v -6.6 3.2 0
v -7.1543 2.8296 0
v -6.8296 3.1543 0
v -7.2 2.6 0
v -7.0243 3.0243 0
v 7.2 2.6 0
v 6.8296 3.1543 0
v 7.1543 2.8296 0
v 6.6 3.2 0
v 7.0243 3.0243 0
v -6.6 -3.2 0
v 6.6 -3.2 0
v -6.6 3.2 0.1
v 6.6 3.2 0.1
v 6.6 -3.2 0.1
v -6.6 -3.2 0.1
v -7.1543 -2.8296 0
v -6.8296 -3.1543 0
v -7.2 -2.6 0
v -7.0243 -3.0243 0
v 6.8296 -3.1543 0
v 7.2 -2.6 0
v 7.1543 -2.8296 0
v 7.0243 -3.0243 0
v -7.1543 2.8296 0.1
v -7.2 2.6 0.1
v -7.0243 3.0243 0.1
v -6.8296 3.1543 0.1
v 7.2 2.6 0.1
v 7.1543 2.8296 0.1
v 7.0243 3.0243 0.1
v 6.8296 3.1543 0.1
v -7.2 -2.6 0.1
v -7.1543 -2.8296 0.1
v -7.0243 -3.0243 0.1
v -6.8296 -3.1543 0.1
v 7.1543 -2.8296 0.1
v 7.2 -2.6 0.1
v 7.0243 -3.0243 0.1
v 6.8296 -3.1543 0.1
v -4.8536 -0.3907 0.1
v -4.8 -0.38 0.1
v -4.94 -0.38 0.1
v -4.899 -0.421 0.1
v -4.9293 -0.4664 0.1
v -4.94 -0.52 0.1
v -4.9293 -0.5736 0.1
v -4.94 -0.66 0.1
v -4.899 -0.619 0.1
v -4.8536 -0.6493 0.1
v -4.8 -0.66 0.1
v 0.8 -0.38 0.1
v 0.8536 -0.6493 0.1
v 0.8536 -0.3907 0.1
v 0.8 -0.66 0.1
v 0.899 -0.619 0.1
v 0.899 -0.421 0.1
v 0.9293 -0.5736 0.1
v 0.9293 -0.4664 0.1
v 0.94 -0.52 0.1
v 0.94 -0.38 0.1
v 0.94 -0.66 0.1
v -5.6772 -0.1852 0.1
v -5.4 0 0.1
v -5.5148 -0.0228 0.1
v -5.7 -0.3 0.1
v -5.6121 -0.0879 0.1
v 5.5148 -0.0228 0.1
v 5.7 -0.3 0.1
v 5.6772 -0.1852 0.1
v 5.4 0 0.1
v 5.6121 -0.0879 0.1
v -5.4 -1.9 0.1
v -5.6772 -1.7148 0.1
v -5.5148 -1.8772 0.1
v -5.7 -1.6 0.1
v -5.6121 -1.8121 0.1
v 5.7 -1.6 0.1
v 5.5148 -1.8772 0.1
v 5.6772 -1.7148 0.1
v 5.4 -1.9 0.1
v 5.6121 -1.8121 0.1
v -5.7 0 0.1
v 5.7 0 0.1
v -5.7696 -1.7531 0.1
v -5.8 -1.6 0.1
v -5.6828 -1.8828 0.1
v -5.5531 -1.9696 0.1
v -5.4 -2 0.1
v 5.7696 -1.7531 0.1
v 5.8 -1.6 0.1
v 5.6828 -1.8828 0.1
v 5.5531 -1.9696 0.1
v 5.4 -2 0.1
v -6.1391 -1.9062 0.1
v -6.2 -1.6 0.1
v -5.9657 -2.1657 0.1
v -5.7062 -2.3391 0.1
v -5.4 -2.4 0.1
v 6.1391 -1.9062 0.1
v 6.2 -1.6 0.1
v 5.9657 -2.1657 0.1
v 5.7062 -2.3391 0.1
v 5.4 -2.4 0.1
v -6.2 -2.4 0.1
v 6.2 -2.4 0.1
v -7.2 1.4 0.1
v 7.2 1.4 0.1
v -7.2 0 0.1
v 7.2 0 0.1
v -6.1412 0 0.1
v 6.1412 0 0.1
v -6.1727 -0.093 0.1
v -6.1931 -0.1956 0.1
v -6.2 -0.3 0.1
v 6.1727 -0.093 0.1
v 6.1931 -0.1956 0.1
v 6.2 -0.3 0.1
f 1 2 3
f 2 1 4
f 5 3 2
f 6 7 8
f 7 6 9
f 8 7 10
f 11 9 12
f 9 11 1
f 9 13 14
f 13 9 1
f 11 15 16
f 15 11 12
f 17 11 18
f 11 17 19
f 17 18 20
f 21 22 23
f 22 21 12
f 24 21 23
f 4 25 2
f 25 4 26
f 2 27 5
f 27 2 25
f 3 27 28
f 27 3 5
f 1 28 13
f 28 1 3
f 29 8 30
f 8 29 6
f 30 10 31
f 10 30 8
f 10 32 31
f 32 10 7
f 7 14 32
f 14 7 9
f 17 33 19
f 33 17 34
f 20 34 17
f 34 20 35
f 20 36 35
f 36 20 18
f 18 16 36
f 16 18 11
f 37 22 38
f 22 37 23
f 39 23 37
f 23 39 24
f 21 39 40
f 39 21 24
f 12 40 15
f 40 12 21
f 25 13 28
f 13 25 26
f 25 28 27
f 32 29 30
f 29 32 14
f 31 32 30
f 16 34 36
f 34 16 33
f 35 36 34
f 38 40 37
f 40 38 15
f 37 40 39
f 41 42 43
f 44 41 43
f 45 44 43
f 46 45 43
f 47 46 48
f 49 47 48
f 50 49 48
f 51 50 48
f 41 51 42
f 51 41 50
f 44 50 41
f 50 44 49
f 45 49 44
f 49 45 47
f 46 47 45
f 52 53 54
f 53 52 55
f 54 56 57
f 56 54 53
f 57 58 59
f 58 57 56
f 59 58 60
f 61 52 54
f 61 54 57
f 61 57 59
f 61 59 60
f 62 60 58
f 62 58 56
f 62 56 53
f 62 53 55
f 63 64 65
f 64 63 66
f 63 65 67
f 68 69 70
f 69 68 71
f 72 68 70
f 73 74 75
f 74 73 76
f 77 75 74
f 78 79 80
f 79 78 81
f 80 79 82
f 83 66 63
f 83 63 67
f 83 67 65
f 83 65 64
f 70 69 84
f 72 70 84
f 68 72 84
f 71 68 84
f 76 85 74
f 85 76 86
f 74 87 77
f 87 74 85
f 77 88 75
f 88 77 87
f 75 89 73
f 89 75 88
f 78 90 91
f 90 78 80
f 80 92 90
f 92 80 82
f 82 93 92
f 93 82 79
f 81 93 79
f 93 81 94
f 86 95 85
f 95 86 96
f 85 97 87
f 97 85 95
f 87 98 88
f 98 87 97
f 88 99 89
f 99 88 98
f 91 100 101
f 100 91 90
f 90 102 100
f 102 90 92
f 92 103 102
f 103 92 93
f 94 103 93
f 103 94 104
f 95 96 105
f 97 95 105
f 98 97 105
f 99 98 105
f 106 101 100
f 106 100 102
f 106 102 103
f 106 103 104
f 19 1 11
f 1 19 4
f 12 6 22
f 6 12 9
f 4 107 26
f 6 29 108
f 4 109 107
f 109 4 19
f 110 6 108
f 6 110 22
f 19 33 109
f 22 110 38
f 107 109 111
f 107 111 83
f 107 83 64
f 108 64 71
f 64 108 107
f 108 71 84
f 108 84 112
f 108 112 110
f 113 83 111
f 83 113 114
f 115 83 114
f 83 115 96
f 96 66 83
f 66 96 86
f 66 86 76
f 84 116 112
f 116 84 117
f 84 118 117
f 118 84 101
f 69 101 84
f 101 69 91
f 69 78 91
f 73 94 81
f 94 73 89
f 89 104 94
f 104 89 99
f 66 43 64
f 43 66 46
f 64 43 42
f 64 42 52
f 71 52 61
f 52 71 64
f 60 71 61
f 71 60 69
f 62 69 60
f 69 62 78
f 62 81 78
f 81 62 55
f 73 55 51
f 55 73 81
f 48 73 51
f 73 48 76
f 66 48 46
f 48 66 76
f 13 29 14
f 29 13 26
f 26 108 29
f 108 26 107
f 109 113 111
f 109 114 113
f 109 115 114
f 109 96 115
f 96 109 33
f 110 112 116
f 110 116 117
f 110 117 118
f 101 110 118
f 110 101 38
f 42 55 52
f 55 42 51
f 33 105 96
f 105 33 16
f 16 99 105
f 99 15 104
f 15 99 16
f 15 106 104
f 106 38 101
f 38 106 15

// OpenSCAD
// file: ../p/box3u12.scad
use <../lib.scad>
function ldraw_lib__box3u12() = [
// 0 Box with 3 Parallel Faces without Any Edges
// 0 Name: box3u12.dat
// 0 Author: J.C. Tchang [tchang]
// 0 !LDRAW_ORG Primitive UPDATE 2014-02
// 0 !LICENSE Licensed under CC BY 4.0 : see CAreadme.txt
// 
// 0 BFC CERTIFY CCW
  [0,"BFC","CERTIFY"],
  [0,"BFC","CCW"],
// 
// 0 !HISTORY 2014-12-23 [PTadmin] Official Update 2014-02
// 
// 
// 4 16 -1 1 1 1 1 1 1 1 -1 -1 1 -1
  [4,16,-1,1,1,1,1,1,1,1,-1,-1,1,-1],
// 4 16 -1 1 1 -1 0 1 1 0 1 1 1 1
  [4,16,-1,1,1,-1,0,1,1,0,1,1,1,1],
// 4 16 1 1 -1 1 0 -1 -1 0 -1 -1 1 -1
  [4,16,1,1,-1,1,0,-1,-1,0,-1,-1,1,-1],
];
module ldraw_lib__box3u12(step=0, col=false, unit=2/5, alt=false, line=0.2, solid=!$preview)
    makepoly(ldraw_lib__box3u12(), step=step, col=col, unit=unit, alt=alt, line=line, solid=solid);
ldraw_lib__box3u12(line=0.2);
// file: ../p/2-4ndis.scad
use <../lib.scad>
function ldraw_lib__2_4ndis() = [
// 0 Disc Negative 0.5
// 0 Name: 2-4ndis.dat
// 0 Author: James Jessiman
// 0 !LDRAW_ORG Primitive UPDATE 2012-01
// 0 !LICENSE Licensed under CC BY 4.0 : see CAreadme.txt
// 
// 0 BFC CERTIFY CCW
  [0,"BFC","CERTIFY"],
  [0,"BFC","CCW"],
// 
// 0 !HISTORY 2002-03-23 [sbliss] Added BFC statement; compacted code
// 0 !HISTORY 2002-04-25 [PTadmin] Official Update 2002-02
// 0 !HISTORY 2007-06-24 [PTadmin] Header formatted for Contributor Agreement
// 0 !HISTORY 2008-07-01 [PTadmin] Official Update 2008-01
// 0 !HISTORY 2012-02-16 [Philo] Changed to CCW
// 0 !HISTORY 2012-03-30 [PTadmin] Official Update 2012-01
// 
// 
// 3 16 0.9239 0 0.3827 1 0 0 1 0 1
  [3,16,0.9239,0,0.3827,1,0,0,1,0,1],
// 3 16 0.7071 0 0.7071 0.9239 0 0.3827 1 0 1
  [3,16,0.7071,0,0.7071,0.9239,0,0.3827,1,0,1],
// 3 16 0.3827 0 0.9239 0.7071 0 0.7071 1 0 1
  [3,16,0.3827,0,0.9239,0.7071,0,0.7071,1,0,1],
// 3 16 0 0 1 0.3827 0 0.9239 1 0 1
  [3,16,0,0,1,0.3827,0,0.9239,1,0,1],
// 3 16 -0.3827 0 0.9239 0 0 1 -1 0 1
  [3,16,-0.3827,0,0.9239,0,0,1,-1,0,1],
// 3 16 -0.7071 0 0.7071 -0.3827 0 0.9239 -1 0 1
  [3,16,-0.7071,0,0.7071,-0.3827,0,0.9239,-1,0,1],
// 3 16 -0.9239 0 0.3827 -0.7071 0 0.7071 -1 0 1
  [3,16,-0.9239,0,0.3827,-0.7071,0,0.7071,-1,0,1],
// 3 16 -1 0 0 -0.9239 0 0.3827 -1 0 1
  [3,16,-1,0,0,-0.9239,0,0.3827,-1,0,1],
];
module ldraw_lib__2_4ndis(step=0, col=false, unit=2/5, alt=false, line=0.2, solid=!$preview)
    makepoly(ldraw_lib__2_4ndis(), step=step, col=col, unit=unit, alt=alt, line=line, solid=solid);
ldraw_lib__2_4ndis(line=0.2);
// file: ../p/2-4chrd.scad
use <../lib.scad>
function ldraw_lib__2_4chrd() = [
// 0 Chord 0.5
// 0 Name: 2-4chrd.dat
// 0 Author: Philippe Hurbain [Philo]
// 0 !LDRAW_ORG Primitive UPDATE 2014-01
// 0 !LICENSE Licensed under CC BY 4.0 : see CAreadme.txt
// 
// 0 BFC CERTIFY CCW
  [0,"BFC","CERTIFY"],
  [0,"BFC","CCW"],
// 
// 0 !HISTORY 2014-06-21 [PTadmin] Official Update 2014-01
// 
// 
// 4 16 0.9239 0 0.3827 -0.9239 0 0.3827 -1 0 0 1 0 0
  [4,16,0.9239,0,0.3827,-0.9239,0,0.3827,-1,0,0,1,0,0],
// 4 16 0.7071 0 0.7071 -0.7071 0 0.7071 -0.9239 0 0.3827 0.9239 0 0.3827
  [4,16,0.7071,0,0.7071,-0.7071,0,0.7071,-0.9239,0,0.3827,0.9239,0,0.3827],
// 4 16 0.3827 0 0.9239 -0.3827 0 0.9239 -0.7071 0 0.7071 0.7071 0 0.7071
  [4,16,0.3827,0,0.9239,-0.3827,0,0.9239,-0.7071,0,0.7071,0.7071,0,0.7071],
// 3 16 0 0 1 -0.3827 0 0.9239 0.3827 0 0.9239
  [3,16,0,0,1,-0.3827,0,0.9239,0.3827,0,0.9239],
];
module ldraw_lib__2_4chrd(step=0, col=false, unit=2/5, alt=false, line=0.2, solid=!$preview)
    makepoly(ldraw_lib__2_4chrd(), step=step, col=col, unit=unit, alt=alt, line=line, solid=solid);
ldraw_lib__2_4chrd(line=0.2);
// file: ../p/1-4ring3.scad
use <../lib.scad>
function ldraw_lib__1_4ring3() = [
// 0 Ring  3 x 0.25
// 0 Name: 1-4ring3.dat
// 0 Author: Karim Nassar
// 0 !LDRAW_ORG Primitive UPDATE 2012-01
// 0 !LICENSE Licensed under CC BY 2.0 and CC BY 4.0 : see CAreadme.txt
// 
// 0 BFC CERTIFY CCW
  [0,"BFC","CERTIFY"],
  [0,"BFC","CCW"],
// 
// 0 !HISTORY 1999-07-05 [PTadmin] Official Update 1999-05
// 0 !HISTORY 2003-01-21 [cavehop] Update Added BFC and 1 digit of significance
// 0 !HISTORY 2003-05-21 [cavehop] Corrected values as indicated by pneaster
// 0 !HISTORY 2003-06-12 [cavehop] Re-corrected values as indicated by pneaster
// 0 !HISTORY 2003-08-01 [PTadmin] Official Update 2003-02
// 0 !HISTORY 2007-06-22 [PTadmin] Header formatted for Contributor Agreement
// 0 !HISTORY 2008-07-01 [PTadmin] Official Update 2008-01
// 0 !HISTORY 2012-02-16 [Philo] Changed to CCW
// 0 !HISTORY 2012-03-30 [PTadmin] Official Update 2012-01
// 
// 
// 4 16 4 0 0 3.6956 0 1.5308 2.7717 0 1.1481 3 0 0
  [4,16,4,0,0,3.6956,0,1.5308,2.7717,0,1.1481,3,0,0],
// 4 16 3.6956 0 1.5308 2.8284 0 2.8284 2.1213 0 2.1213 2.7717 0 1.1481
  [4,16,3.6956,0,1.5308,2.8284,0,2.8284,2.1213,0,2.1213,2.7717,0,1.1481],
// 4 16 2.8284 0 2.8284 1.5308 0 3.6956 1.1481 0 2.7717 2.1213 0 2.1213
  [4,16,2.8284,0,2.8284,1.5308,0,3.6956,1.1481,0,2.7717,2.1213,0,2.1213],
// 4 16 1.5308 0 3.6956 0 0 4 0 0 3 1.1481 0 2.7717
  [4,16,1.5308,0,3.6956,0,0,4,0,0,3,1.1481,0,2.7717],
];
module ldraw_lib__1_4ring3(step=0, col=false, unit=2/5, alt=false, line=0.2, solid=!$preview)
    makepoly(ldraw_lib__1_4ring3(), step=step, col=col, unit=unit, alt=alt, line=line, solid=solid);
ldraw_lib__1_4ring3(line=0.2);
// file: ../p/1-4ring1.scad
use <../lib.scad>
function ldraw_lib__1_4ring1() = [
// 0 Ring  1 x 0.25
// 0 Name: 1-4ring1.dat
// 0 Author: Chris Dee [cwdee]
// 0 !LDRAW_ORG Primitive UPDATE 2012-01
// 0 !LICENSE Licensed under CC BY 2.0 and CC BY 4.0 : see CAreadme.txt
// 
// 0 BFC CERTIFY CCW
  [0,"BFC","CERTIFY"],
  [0,"BFC","CCW"],
// 
// 0 !HISTORY 2000-05-07 [PTadmin] Official Update 2000-01
// 0 !HISTORY 2002-11-22 [hafhead] Added BFC statement
// 0 !HISTORY 2002-11-30 [PTadmin] Official Update 2002-05
// 0 !HISTORY 2007-06-22 [PTadmin] Header formatted for Contributor Agreement
// 0 !HISTORY 2008-07-01 [PTadmin] Official Update 2008-01
// 0 !HISTORY 2012-02-16 [Philo] Changed to CCW
// 0 !HISTORY 2012-03-30 [PTadmin] Official Update 2012-01
// 
// 
// 4 16 2 0 0 1.8478 0 0.7654 0.9239 0 0.3827 1 0 0
  [4,16,2,0,0,1.8478,0,0.7654,0.9239,0,0.3827,1,0,0],
// 4 16 1.8478 0 0.7654 1.4142 0 1.4142 0.7071 0 0.7071 0.9239 0 0.3827
  [4,16,1.8478,0,0.7654,1.4142,0,1.4142,0.7071,0,0.7071,0.9239,0,0.3827],
// 4 16 1.4142 0 1.4142 0.7654 0 1.8478 0.3827 0 0.9239 0.7071 0 0.7071
  [4,16,1.4142,0,1.4142,0.7654,0,1.8478,0.3827,0,0.9239,0.7071,0,0.7071],
// 4 16 0.7654 0 1.8478 0 0 2 0 0 1 0.3827 0 0.9239
  [4,16,0.7654,0,1.8478,0,0,2,0,0,1,0.3827,0,0.9239],
];
module ldraw_lib__1_4ring1(step=0, col=false, unit=2/5, alt=false, line=0.2, solid=!$preview)
    makepoly(ldraw_lib__1_4ring1(), step=step, col=col, unit=unit, alt=alt, line=line, solid=solid);
ldraw_lib__1_4ring1(line=0.2);
// file: ../p/1-4ndis.scad
use <../lib.scad>
function ldraw_lib__1_4ndis() = [
// 0 Disc Negative 0.25
// 0 Name: 1-4ndis.dat
// 0 Author: James Jessiman
// 0 !LDRAW_ORG Primitive UPDATE 2012-01
// 0 !LICENSE Licensed under CC BY 4.0 : see CAreadme.txt
// 
// 0 BFC CERTIFY CCW
  [0,"BFC","CERTIFY"],
  [0,"BFC","CCW"],
// 
// 0 !HISTORY 2002-03-23 [sbliss] Added BFC Statement
// 0 !HISTORY 2002-04-25 [PTadmin] Official Update 2002-02
// 0 !HISTORY 2007-06-22 [PTadmin] Header formatted for Contributor Agreement
// 0 !HISTORY 2008-07-01 [PTadmin] Official Update 2008-01
// 0 !HISTORY 2012-02-16 [Philo] Changed to CCW
// 0 !HISTORY 2012-03-30 [PTadmin] Official Update 2012-01
// 
// 
// 3 16 0.9239 0 0.3827 1 0 0 1 0 1
  [3,16,0.9239,0,0.3827,1,0,0,1,0,1],
// 3 16 0.7071 0 0.7071 0.9239 0 0.3827 1 0 1
  [3,16,0.7071,0,0.7071,0.9239,0,0.3827,1,0,1],
// 3 16 0.3827 0 0.9239 0.7071 0 0.7071 1 0 1
  [3,16,0.3827,0,0.9239,0.7071,0,0.7071,1,0,1],
// 3 16 0 0 1 0.3827 0 0.9239 1 0 1
  [3,16,0,0,1,0.3827,0,0.9239,1,0,1],
];
module ldraw_lib__1_4ndis(step=0, col=false, unit=2/5, alt=false, line=0.2, solid=!$preview)
    makepoly(ldraw_lib__1_4ndis(), step=step, col=col, unit=unit, alt=alt, line=line, solid=solid);
ldraw_lib__1_4ndis(line=0.2);
// file: ../p/1-4cyli.scad
use <../lib.scad>
function ldraw_lib__1_4cyli() = [
// 0 Cylinder 0.25
// 0 Name: 1-4cyli.dat
// 0 Author: James Jessiman
// 0 !LDRAW_ORG Primitive UPDATE 2012-01
// 0 !LICENSE Licensed under CC BY 4.0 : see CAreadme.txt
// 
// 0 BFC CERTIFY CCW
  [0,"BFC","CERTIFY"],
  [0,"BFC","CCW"],
// 
// 0 !HISTORY 2002-03-23 [sbliss] Added BFC statement.
// 0 !HISTORY 2002-04-25 [PTadmin] Official Update 2002-02
// 0 !HISTORY 2007-06-22 [PTadmin] Header formatted for Contributor Agreement
// 0 !HISTORY 2008-07-01 [PTadmin] Official Update 2008-01
// 0 !HISTORY 2012-02-16 [Philo] Changed to CCW
// 0 !HISTORY 2012-03-30 [PTadmin] Official Update 2012-01
// 
// 
// 4 16 1 1 0 0.9239 1 0.3827 0.9239 0 0.3827 1 0 0
  [4,16,1,1,0,0.9239,1,0.3827,0.9239,0,0.3827,1,0,0],
// 5 24 1 0 0 1 1 0 0.9239 0 0.3827 1 0 -1
  [5,24,1,0,0,1,1,0,0.9239,0,0.3827,1,0,-1],
// 4 16 0.9239 1 0.3827 0.7071 1 0.7071 0.7071 0 0.7071 0.9239 0 0.3827
  [4,16,0.9239,1,0.3827,0.7071,1,0.7071,0.7071,0,0.7071,0.9239,0,0.3827],
// 5 24 0.9239 0 0.3827 0.9239 1 0.3827 0.7071 0 0.7071 1 0 0
  [5,24,0.9239,0,0.3827,0.9239,1,0.3827,0.7071,0,0.7071,1,0,0],
// 4 16 0.7071 1 0.7071 0.3827 1 0.9239 0.3827 0 0.9239 0.7071 0 0.7071
  [4,16,0.7071,1,0.7071,0.3827,1,0.9239,0.3827,0,0.9239,0.7071,0,0.7071],
// 5 24 0.7071 0 0.7071 0.7071 1 0.7071 0.3827 0 0.9239 0.9239 0 0.3827
  [5,24,0.7071,0,0.7071,0.7071,1,0.7071,0.3827,0,0.9239,0.9239,0,0.3827],
// 4 16 0.3827 1 0.9239 0 1 1 0 0 1 0.3827 0 0.9239
  [4,16,0.3827,1,0.9239,0,1,1,0,0,1,0.3827,0,0.9239],
// 5 24 0.3827 0 0.9239 0.3827 1 0.9239 0 0 1 0.7071 0 0.7071
  [5,24,0.3827,0,0.9239,0.3827,1,0.9239,0,0,1,0.7071,0,0.7071],
// 5 24 0 0 1 0 1 1 0.3827 0 0.9239 -1 0 1
  [5,24,0,0,1,0,1,1,0.3827,0,0.9239,-1,0,1],
];
module ldraw_lib__1_4cyli(step=0, col=false, unit=2/5, alt=false, line=0.2, solid=!$preview)
    makepoly(ldraw_lib__1_4cyli(), step=step, col=col, unit=unit, alt=alt, line=line, solid=solid);
ldraw_lib__1_4cyli(line=0.2);
// file: ../p/1-4chrd.scad
use <../lib.scad>
function ldraw_lib__1_4chrd() = [
// 0 Chord 0.25
// 0 Name: 1-4chrd.dat
// 0 Author: Tony Hafner [hafhead]
// 0 !LDRAW_ORG Primitive UPDATE 2012-02
// 0 !LICENSE Licensed under CC BY 2.0 and CC BY 4.0 : see CAreadme.txt
// 
// 0 BFC CERTIFY CCW
  [0,"BFC","CERTIFY"],
  [0,"BFC","CCW"],
// 
// 0 !HISTORY 2004-04-22 [PTadmin] Official Update 2004-02
// 0 !HISTORY 2007-10-09 [PTadmin] Header formatted for Contributor Agreement
// 0 !HISTORY 2008-07-01 [PTadmin] Official Update 2008-01
// 0 !HISTORY 2012-08-02 [MMR1988] Re-creation with PrimGen2 and Rectifier
// 0 !HISTORY 2012-08-09 [PTadmin] Official Update 2012-02
// 
// 
// 4 16 0.9239 0 0.3827 0.3827 0 0.9239 0 0 1 1 0 0
  [4,16,0.9239,0,0.3827,0.3827,0,0.9239,0,0,1,1,0,0],
// 3 16 0.7071 0 0.7071 0.3827 0 0.9239 0.9239 0 0.3827
  [3,16,0.7071,0,0.7071,0.3827,0,0.9239,0.9239,0,0.3827],
];
module ldraw_lib__1_4chrd(step=0, col=false, unit=2/5, alt=false, line=0.2, solid=!$preview)
    makepoly(ldraw_lib__1_4chrd(), step=step, col=col, unit=unit, alt=alt, line=line, solid=solid);
ldraw_lib__1_4chrd(line=0.2);
// main file
use <../lib.scad>
use <../p/1-4chrd.scad>
use <../p/1-4cyli.scad>
use <../p/1-4ndis.scad>
use <../p/1-4ring1.scad>
use <../p/1-4ring3.scad>
use <../p/2-4chrd.scad>
use <../p/2-4ndis.scad>
use <../p/box3u12.scad>
function ldraw_lib__6142617h() = [
// 0 Sticker  0.8 x  1.8 with Black Stripe and Brakelamp on Red Background
// 0 Name: 6142617h.dat
// 0 Author: Massimo Maso [Sirio]
// 0 !LDRAW_ORG Part UPDATE 2023-02
// 0 !LICENSE Licensed under CC BY 4.0 : see CAreadme.txt
// 
// 0 BFC CERTIFY CCW
  [0,"BFC","CERTIFY"],
  [0,"BFC","CCW"],
// 
// 0 !KEYWORDS Camaro, Chevrolet, Drag, Race, Set 75874, Speed Champions, SS
// 
// 0 !HISTORY 2023-04-17 [OrionP] Official Update 2023-02
// 
// 
// 0 // Primitives
// 1 16 -16.5 0 6.5 -1.5 0 0 0 -1 0 0 0 1.5 1-4chrd.dat
  [1,16,-16.5,0,6.5,-1.5,0,0,0,-1,0,0,0,1.5, ldraw_lib__1_4chrd()],
// 1 16 16.5 0 6.5 1.5 0 0 0 -1 0 0 0 1.5 1-4chrd.dat
  [1,16,16.5,0,6.5,1.5,0,0,0,-1,0,0,0,1.5, ldraw_lib__1_4chrd()],
// 1 16 0 -.25 0 16.5 0 0 0 .25 0 0 0 8 box3u12.dat
  [1,16,0,-.25,0,16.5,0,0,0,.25,0,0,0,8, ldraw_lib__box3u12()],
// 1 16 -16.5 0 -6.5 -1.5 0 0 0 -1 0 0 0 -1.5 1-4chrd.dat
  [1,16,-16.5,0,-6.5,-1.5,0,0,0,-1,0,0,0,-1.5, ldraw_lib__1_4chrd()],
// 1 16 16.5 0 -6.5 1.5 0 0 0 -1 0 0 0 -1.5 1-4chrd.dat
  [1,16,16.5,0,-6.5,1.5,0,0,0,-1,0,0,0,-1.5, ldraw_lib__1_4chrd()],
// 1 16 -16.5 0 6.5 -1.5 0 0 0 -.25 0 0 0 1.5 1-4cyli.dat
  [1,16,-16.5,0,6.5,-1.5,0,0,0,-.25,0,0,0,1.5, ldraw_lib__1_4cyli()],
// 1 16 16.5 0 6.5 1.5 0 0 0 -.25 0 0 0 1.5 1-4cyli.dat
  [1,16,16.5,0,6.5,1.5,0,0,0,-.25,0,0,0,1.5, ldraw_lib__1_4cyli()],
// 1 16 -16.5 0 -6.5 -1.5 0 0 0 -.25 0 0 0 -1.5 1-4cyli.dat
  [1,16,-16.5,0,-6.5,-1.5,0,0,0,-.25,0,0,0,-1.5, ldraw_lib__1_4cyli()],
// 1 16 16.5 0 -6.5 1.5 0 0 0 -.25 0 0 0 -1.5 1-4cyli.dat
  [1,16,16.5,0,-6.5,1.5,0,0,0,-.25,0,0,0,-1.5, ldraw_lib__1_4cyli()],
// 1 4 -16.5 -.25 6.5 -1.5 0 0 0 1 0 0 0 1.5 1-4chrd.dat
  [1,4,-16.5,-.25,6.5,-1.5,0,0,0,1,0,0,0,1.5, ldraw_lib__1_4chrd()],
// 1 4 16.5 -.25 6.5 1.5 0 0 0 1 0 0 0 1.5 1-4chrd.dat
  [1,4,16.5,-.25,6.5,1.5,0,0,0,1,0,0,0,1.5, ldraw_lib__1_4chrd()],
// 1 4 -16.5 -.25 -6.5 -1.5 0 0 0 1 0 0 0 -1.5 1-4chrd.dat
  [1,4,-16.5,-.25,-6.5,-1.5,0,0,0,1,0,0,0,-1.5, ldraw_lib__1_4chrd()],
// 1 4 16.5 -.25 -6.5 1.5 0 0 0 1 0 0 0 -1.5 1-4chrd.dat
  [1,4,16.5,-.25,-6.5,1.5,0,0,0,1,0,0,0,-1.5, ldraw_lib__1_4chrd()],
// 1 320 -12 -.25 -1.3 0 0 -.35 0 1 0 .35 0 0 2-4ndis.dat
  [1,320,-12,-.25,-1.3,0,0,-.35,0,1,0,.35,0,0, ldraw_lib__2_4ndis()],
// 1 4 -12 -.25 -1.3 0 0 -.35 0 1 0 .35 0 0 2-4chrd.dat
  [1,4,-12,-.25,-1.3,0,0,-.35,0,1,0,.35,0,0, ldraw_lib__2_4chrd()],
// 1 4 2 -.25 -1.3 0 0 .35 0 1 0 .35 0 0 2-4chrd.dat
  [1,4,2,-.25,-1.3,0,0,.35,0,1,0,.35,0,0, ldraw_lib__2_4chrd()],
// 1 320 2 -.25 -1.3 0 0 .35 0 1 0 .35 0 0 2-4ndis.dat
  [1,320,2,-.25,-1.3,0,0,.35,0,1,0,.35,0,0, ldraw_lib__2_4ndis()],
// 1 320 -13.5 -.25 -.75 -.75 0 0 0 1 0 0 0 .75 1-4chrd.dat
  [1,320,-13.5,-.25,-.75,-.75,0,0,0,1,0,0,0,.75, ldraw_lib__1_4chrd()],
// 1 320 13.5 -.25 -.75 .75 0 0 0 1 0 0 0 .75 1-4chrd.dat
  [1,320,13.5,-.25,-.75,.75,0,0,0,1,0,0,0,.75, ldraw_lib__1_4chrd()],
// 1 320 -13.5 -.25 -4 -.75 0 0 0 1 0 0 0 -.75 1-4chrd.dat
  [1,320,-13.5,-.25,-4,-.75,0,0,0,1,0,0,0,-.75, ldraw_lib__1_4chrd()],
// 1 320 13.5 -.25 -4 .75 0 0 0 1 0 0 0 -.75 1-4chrd.dat
  [1,320,13.5,-.25,-4,.75,0,0,0,1,0,0,0,-.75, ldraw_lib__1_4chrd()],
// 1 0 -13.5 -.25 -.75 -.75 0 0 0 1 0 0 0 .75 1-4ndis.dat
  [1,0,-13.5,-.25,-.75,-.75,0,0,0,1,0,0,0,.75, ldraw_lib__1_4ndis()],
// 1 0 13.5 -.25 -.75 .75 0 0 0 1 0 0 0 .75 1-4ndis.dat
  [1,0,13.5,-.25,-.75,.75,0,0,0,1,0,0,0,.75, ldraw_lib__1_4ndis()],
// 1 0 -13.5 -.25 -4 -.25 0 0 0 1 0 0 0 -.25 1-4ring3.dat
  [1,0,-13.5,-.25,-4,-.25,0,0,0,1,0,0,0,-.25, ldraw_lib__1_4ring3()],
// 1 0 13.5 -.25 -4 .25 0 0 0 1 0 0 0 -.25 1-4ring3.dat
  [1,0,13.5,-.25,-4,.25,0,0,0,1,0,0,0,-.25, ldraw_lib__1_4ring3()],
// 1 0 -13.5 -.25 -4 -1 0 0 0 1 0 0 0 -1 1-4ring1.dat
  [1,0,-13.5,-.25,-4,-1,0,0,0,1,0,0,0,-1, ldraw_lib__1_4ring1()],
// 1 0 13.5 -.25 -4 1 0 0 0 1 0 0 0 -1 1-4ring1.dat
  [1,0,13.5,-.25,-4,1,0,0,0,1,0,0,0,-1, ldraw_lib__1_4ring1()],
// 1 4 -13.5 -.25 -4 -2 0 0 0 1 0 0 0 -2 1-4ndis.dat
  [1,4,-13.5,-.25,-4,-2,0,0,0,1,0,0,0,-2, ldraw_lib__1_4ndis()],
// 1 4 13.5 -.25 -4 2 0 0 0 1 0 0 0 -2 1-4ndis.dat
  [1,4,13.5,-.25,-4,2,0,0,0,1,0,0,0,-2, ldraw_lib__1_4ndis()],
// 0 // Bottom face
// 4 16 -16.5 0 8 -16.5 0 -8 -18 0 -6.5 -18 0 6.5
  [4,16,-16.5,0,8,-16.5,0,-8,-18,0,-6.5,-18,0,6.5],
// 4 16 16.5 0 8 18 0 6.5 18 0 -6.5 16.5 0 -8
  [4,16,16.5,0,8,18,0,6.5,18,0,-6.5,16.5,0,-8],
// 0 // Lateral face
// 3 16 -18 0 6.5 -18 -.25 3.5 -18 -.25 6.5
  [3,16,-18,0,6.5,-18,-.25,3.5,-18,-.25,6.5],
// 3 16 18 0 6.5 18 -.25 6.5 18 -.25 3.5
  [3,16,18,0,6.5,18,-.25,6.5,18,-.25,3.5],
// 4 16 -18 0 6.5 -18 0 -6.5 -18 -.25 0 -18 -.25 3.5
  [4,16,-18,0,6.5,-18,0,-6.5,-18,-.25,0,-18,-.25,3.5],
// 4 16 18 0 6.5 18 -.25 3.5 18 -.25 0 18 0 -6.5
  [4,16,18,0,6.5,18,-.25,3.5,18,-.25,0,18,0,-6.5],
// 3 16 -18 0 -6.5 -18 -.25 -6.5 -18 -.25 0
  [3,16,-18,0,-6.5,-18,-.25,-6.5,-18,-.25,0],
// 3 16 18 0 -6.5 18 -.25 0 18 -.25 -6.5
  [3,16,18,0,-6.5,18,-.25,0,18,-.25,-6.5],
// 0 // Top face
// 0 // Black faces
// 3 0 -18 -.25 3.5 -18 -.25 0 -15.353 -.25 0
  [3,0,-18,-.25,3.5,-18,-.25,0,-15.353,-.25,0],
// 3 0 -18 -.25 3.5 -15.353 -.25 0 -14.25 -.25 0
  [3,0,-18,-.25,3.5,-15.353,-.25,0,-14.25,-.25,0],
// 3 0 -18 -.25 3.5 -14.25 -.25 0 -13.5 -.25 0
  [3,0,-18,-.25,3.5,-14.25,-.25,0,-13.5,-.25,0],
// 4 0 -18 -.25 3.5 -13.5 -.25 0 13.5 -.25 0 18 -.25 3.5
  [4,0,-18,-.25,3.5,-13.5,-.25,0,13.5,-.25,0,18,-.25,3.5],
// 3 0 18 -.25 3.5 13.5 -.25 0 14.25 -.25 0
  [3,0,18,-.25,3.5,13.5,-.25,0,14.25,-.25,0],
// 3 0 18 -.25 3.5 14.25 -.25 0 15.353 -.25 0
  [3,0,18,-.25,3.5,14.25,-.25,0,15.353,-.25,0],
// 3 0 18 -.25 3.5 15.353 -.25 0 18 -.25 0
  [3,0,18,-.25,3.5,15.353,-.25,0,18,-.25,0],
// 4 0 -14.25 -.25 0 -15.353 -.25 0 -15.4318 -.25 -.2324 -15.4828 -.25 -.489
  [4,0,-14.25,-.25,0,-15.353,-.25,0,-15.4318,-.25,-.2324,-15.4828,-.25,-.489],
// 4 0 -14.25 -.25 0 -15.4828 -.25 -.489 -15.5 -.25 -.75 -15.5 -.25 -4
  [4,0,-14.25,-.25,0,-15.4828,-.25,-.489,-15.5,-.25,-.75,-15.5,-.25,-4],
// 4 0 -14.25 -.25 -.75 -14.25 -.25 0 -15.5 -.25 -4 -14.5 -.25 -4
  [4,0,-14.25,-.25,-.75,-14.25,-.25,0,-15.5,-.25,-4,-14.5,-.25,-4],
// 3 0 -14.25 -.25 -.75 -14.5 -.25 -4 -14.25 -.25 -4
  [3,0,-14.25,-.25,-.75,-14.5,-.25,-4,-14.25,-.25,-4],
// 4 0 14.25 -.25 0 15.4828 -.25 -.489 15.4318 -.25 -.2324 15.353 -.25 0
  [4,0,14.25,-.25,0,15.4828,-.25,-.489,15.4318,-.25,-.2324,15.353,-.25,0],
// 4 0 14.25 -.25 0 15.5 -.25 -4 15.5 -.25 -.75 15.4828 -.25 -.489
  [4,0,14.25,-.25,0,15.5,-.25,-4,15.5,-.25,-.75,15.4828,-.25,-.489],
// 4 0 14.25 -.25 -.75 14.5 -.25 -4 15.5 -.25 -4 14.25 -.25 0
  [4,0,14.25,-.25,-.75,14.5,-.25,-4,15.5,-.25,-4,14.25,-.25,0],
// 3 0 14.25 -.25 -.75 14.25 -.25 -4 14.5 -.25 -4
  [3,0,14.25,-.25,-.75,14.25,-.25,-4,14.5,-.25,-4],
// 4 0 -13.5 -.25 -5 13.5 -.25 -5 13.5 -.25 -4.75 -13.5 -.25 -4.75
  [4,0,-13.5,-.25,-5,13.5,-.25,-5,13.5,-.25,-4.75,-13.5,-.25,-4.75],
// 4 0 -13.5 -.25 -5 -13.5 -.25 -6 13.5 -.25 -6 13.5 -.25 -5
  [4,0,-13.5,-.25,-5,-13.5,-.25,-6,13.5,-.25,-6,13.5,-.25,-5],
// 0 // Dark red faces
// 4 320 -13.5 -.25 0 -14.25 -.25 -.75 -12.35 -.25 -1.3 -12.35 -.25 -.95
  [4,320,-13.5,-.25,0,-14.25,-.25,-.75,-12.35,-.25,-1.3,-12.35,-.25,-.95],
// 3 320 -13.5 -.25 0 -12.35 -.25 -.95 -12 -.25 -.95
  [3,320,-13.5,-.25,0,-12.35,-.25,-.95,-12,-.25,-.95],
// 3 320 -13.5 -.25 0 -12 -.25 -.95 2 -.25 -.95
  [3,320,-13.5,-.25,0,-12,-.25,-.95,2,-.25,-.95],
// 4 320 -13.5 -.25 0 2 -.25 -.95 2.35 -.25 -.95 13.5 -.25 0
  [4,320,-13.5,-.25,0,2,-.25,-.95,2.35,-.25,-.95,13.5,-.25,0],
// 4 320 14.25 -.25 -.75 13.5 -.25 0 2.35 -.25 -.95 2.35 -.25 -1.3
  [4,320,14.25,-.25,-.75,13.5,-.25,0,2.35,-.25,-.95,2.35,-.25,-1.3],
// 4 320 14.25 -.25 -.75 2.35 -.25 -1.3 2.35 -.25 -1.65 14.25 -.25 -4
  [4,320,14.25,-.25,-.75,2.35,-.25,-1.3,2.35,-.25,-1.65,14.25,-.25,-4],
// 4 320 13.5 -.25 -4.75 14.25 -.25 -4 2.35 -.25 -1.65 2 -.25 -1.65
  [4,320,13.5,-.25,-4.75,14.25,-.25,-4,2.35,-.25,-1.65,2,-.25,-1.65],
// 4 320 13.5 -.25 -4.75 2 -.25 -1.65 -12 -.25 -1.65 -13.5 -.25 -4.75
  [4,320,13.5,-.25,-4.75,2,-.25,-1.65,-12,-.25,-1.65,-13.5,-.25,-4.75],
// 4 320 -14.25 -.25 -4 -13.5 -.25 -4.75 -12 -.25 -1.65 -12.35 -.25 -1.65
  [4,320,-14.25,-.25,-4,-13.5,-.25,-4.75,-12,-.25,-1.65,-12.35,-.25,-1.65],
// 4 320 -14.25 -.25 -4 -12.35 -.25 -1.65 -12.35 -.25 -1.3 -14.25 -.25 -.75
  [4,320,-14.25,-.25,-4,-12.35,-.25,-1.65,-12.35,-.25,-1.3,-14.25,-.25,-.75],
// 0 // Red faces
// 4 4 -18 -.25 6.5 18 -.25 6.5 16.5 -.25 8 -16.5 -.25 8
  [4,4,-18,-.25,6.5,18,-.25,6.5,16.5,-.25,8,-16.5,-.25,8],
// 4 4 -18 -.25 6.5 -18 -.25 3.5 18 -.25 3.5 18 -.25 6.5
  [4,4,-18,-.25,6.5,-18,-.25,3.5,18,-.25,3.5,18,-.25,6.5],
// 3 4 -18 -.25 0 -15.4318 -.25 -.2324 -15.353 -.25 0
  [3,4,-18,-.25,0,-15.4318,-.25,-.2324,-15.353,-.25,0],
// 3 4 -18 -.25 0 -15.4828 -.25 -.489 -15.4318 -.25 -.2324
  [3,4,-18,-.25,0,-15.4828,-.25,-.489,-15.4318,-.25,-.2324],
// 3 4 -18 -.25 0 -15.5 -.25 -.75 -15.4828 -.25 -.489
  [3,4,-18,-.25,0,-15.5,-.25,-.75,-15.4828,-.25,-.489],
// 4 4 -18 -.25 0 -18 -.25 -6.5 -15.5 -.25 -4 -15.5 -.25 -.75
  [4,4,-18,-.25,0,-18,-.25,-6.5,-15.5,-.25,-4,-15.5,-.25,-.75],
// 3 4 18 -.25 0 15.353 -.25 0 15.4318 -.25 -.2324
  [3,4,18,-.25,0,15.353,-.25,0,15.4318,-.25,-.2324],
// 3 4 18 -.25 0 15.4318 -.25 -.2324 15.4828 -.25 -.489
  [3,4,18,-.25,0,15.4318,-.25,-.2324,15.4828,-.25,-.489],
// 3 4 18 -.25 0 15.4828 -.25 -.489 15.5 -.25 -.75
  [3,4,18,-.25,0,15.4828,-.25,-.489,15.5,-.25,-.75],
// 4 4 18 -.25 0 15.5 -.25 -.75 15.5 -.25 -4 18 -.25 -6.5
  [4,4,18,-.25,0,15.5,-.25,-.75,15.5,-.25,-4,18,-.25,-6.5],
// 4 4 -12 -.25 -.95 -12 -.25 -1.65 2 -.25 -1.65 2 -.25 -.95
  [4,4,-12,-.25,-.95,-12,-.25,-1.65,2,-.25,-1.65,2,-.25,-.95],
// 4 4 -16.5 -.25 -8 -15.5 -.25 -6 -15.5 -.25 -4 -18 -.25 -6.5
  [4,4,-16.5,-.25,-8,-15.5,-.25,-6,-15.5,-.25,-4,-18,-.25,-6.5],
// 3 4 -16.5 -.25 -8 -13.5 -.25 -6 -15.5 -.25 -6
  [3,4,-16.5,-.25,-8,-13.5,-.25,-6,-15.5,-.25,-6],
// 4 4 -16.5 -.25 -8 16.5 -.25 -8 13.5 -.25 -6 -13.5 -.25 -6
  [4,4,-16.5,-.25,-8,16.5,-.25,-8,13.5,-.25,-6,-13.5,-.25,-6],
// 3 4 16.5 -.25 -8 15.5 -.25 -6 13.5 -.25 -6
  [3,4,16.5,-.25,-8,15.5,-.25,-6,13.5,-.25,-6],
// 4 4 16.5 -.25 -8 18 -.25 -6.5 15.5 -.25 -4 15.5 -.25 -6
  [4,4,16.5,-.25,-8,18,-.25,-6.5,15.5,-.25,-4,15.5,-.25,-6],
];
module ldraw_lib__6142617h(step=0, col=false, unit=2/5, alt=false, line=0.2, solid=!$preview)
    makepoly(ldraw_lib__6142617h(), step=step, col=col, unit=unit, alt=alt, line=line, solid=solid);
ldraw_lib__6142617h(line=0.2);
